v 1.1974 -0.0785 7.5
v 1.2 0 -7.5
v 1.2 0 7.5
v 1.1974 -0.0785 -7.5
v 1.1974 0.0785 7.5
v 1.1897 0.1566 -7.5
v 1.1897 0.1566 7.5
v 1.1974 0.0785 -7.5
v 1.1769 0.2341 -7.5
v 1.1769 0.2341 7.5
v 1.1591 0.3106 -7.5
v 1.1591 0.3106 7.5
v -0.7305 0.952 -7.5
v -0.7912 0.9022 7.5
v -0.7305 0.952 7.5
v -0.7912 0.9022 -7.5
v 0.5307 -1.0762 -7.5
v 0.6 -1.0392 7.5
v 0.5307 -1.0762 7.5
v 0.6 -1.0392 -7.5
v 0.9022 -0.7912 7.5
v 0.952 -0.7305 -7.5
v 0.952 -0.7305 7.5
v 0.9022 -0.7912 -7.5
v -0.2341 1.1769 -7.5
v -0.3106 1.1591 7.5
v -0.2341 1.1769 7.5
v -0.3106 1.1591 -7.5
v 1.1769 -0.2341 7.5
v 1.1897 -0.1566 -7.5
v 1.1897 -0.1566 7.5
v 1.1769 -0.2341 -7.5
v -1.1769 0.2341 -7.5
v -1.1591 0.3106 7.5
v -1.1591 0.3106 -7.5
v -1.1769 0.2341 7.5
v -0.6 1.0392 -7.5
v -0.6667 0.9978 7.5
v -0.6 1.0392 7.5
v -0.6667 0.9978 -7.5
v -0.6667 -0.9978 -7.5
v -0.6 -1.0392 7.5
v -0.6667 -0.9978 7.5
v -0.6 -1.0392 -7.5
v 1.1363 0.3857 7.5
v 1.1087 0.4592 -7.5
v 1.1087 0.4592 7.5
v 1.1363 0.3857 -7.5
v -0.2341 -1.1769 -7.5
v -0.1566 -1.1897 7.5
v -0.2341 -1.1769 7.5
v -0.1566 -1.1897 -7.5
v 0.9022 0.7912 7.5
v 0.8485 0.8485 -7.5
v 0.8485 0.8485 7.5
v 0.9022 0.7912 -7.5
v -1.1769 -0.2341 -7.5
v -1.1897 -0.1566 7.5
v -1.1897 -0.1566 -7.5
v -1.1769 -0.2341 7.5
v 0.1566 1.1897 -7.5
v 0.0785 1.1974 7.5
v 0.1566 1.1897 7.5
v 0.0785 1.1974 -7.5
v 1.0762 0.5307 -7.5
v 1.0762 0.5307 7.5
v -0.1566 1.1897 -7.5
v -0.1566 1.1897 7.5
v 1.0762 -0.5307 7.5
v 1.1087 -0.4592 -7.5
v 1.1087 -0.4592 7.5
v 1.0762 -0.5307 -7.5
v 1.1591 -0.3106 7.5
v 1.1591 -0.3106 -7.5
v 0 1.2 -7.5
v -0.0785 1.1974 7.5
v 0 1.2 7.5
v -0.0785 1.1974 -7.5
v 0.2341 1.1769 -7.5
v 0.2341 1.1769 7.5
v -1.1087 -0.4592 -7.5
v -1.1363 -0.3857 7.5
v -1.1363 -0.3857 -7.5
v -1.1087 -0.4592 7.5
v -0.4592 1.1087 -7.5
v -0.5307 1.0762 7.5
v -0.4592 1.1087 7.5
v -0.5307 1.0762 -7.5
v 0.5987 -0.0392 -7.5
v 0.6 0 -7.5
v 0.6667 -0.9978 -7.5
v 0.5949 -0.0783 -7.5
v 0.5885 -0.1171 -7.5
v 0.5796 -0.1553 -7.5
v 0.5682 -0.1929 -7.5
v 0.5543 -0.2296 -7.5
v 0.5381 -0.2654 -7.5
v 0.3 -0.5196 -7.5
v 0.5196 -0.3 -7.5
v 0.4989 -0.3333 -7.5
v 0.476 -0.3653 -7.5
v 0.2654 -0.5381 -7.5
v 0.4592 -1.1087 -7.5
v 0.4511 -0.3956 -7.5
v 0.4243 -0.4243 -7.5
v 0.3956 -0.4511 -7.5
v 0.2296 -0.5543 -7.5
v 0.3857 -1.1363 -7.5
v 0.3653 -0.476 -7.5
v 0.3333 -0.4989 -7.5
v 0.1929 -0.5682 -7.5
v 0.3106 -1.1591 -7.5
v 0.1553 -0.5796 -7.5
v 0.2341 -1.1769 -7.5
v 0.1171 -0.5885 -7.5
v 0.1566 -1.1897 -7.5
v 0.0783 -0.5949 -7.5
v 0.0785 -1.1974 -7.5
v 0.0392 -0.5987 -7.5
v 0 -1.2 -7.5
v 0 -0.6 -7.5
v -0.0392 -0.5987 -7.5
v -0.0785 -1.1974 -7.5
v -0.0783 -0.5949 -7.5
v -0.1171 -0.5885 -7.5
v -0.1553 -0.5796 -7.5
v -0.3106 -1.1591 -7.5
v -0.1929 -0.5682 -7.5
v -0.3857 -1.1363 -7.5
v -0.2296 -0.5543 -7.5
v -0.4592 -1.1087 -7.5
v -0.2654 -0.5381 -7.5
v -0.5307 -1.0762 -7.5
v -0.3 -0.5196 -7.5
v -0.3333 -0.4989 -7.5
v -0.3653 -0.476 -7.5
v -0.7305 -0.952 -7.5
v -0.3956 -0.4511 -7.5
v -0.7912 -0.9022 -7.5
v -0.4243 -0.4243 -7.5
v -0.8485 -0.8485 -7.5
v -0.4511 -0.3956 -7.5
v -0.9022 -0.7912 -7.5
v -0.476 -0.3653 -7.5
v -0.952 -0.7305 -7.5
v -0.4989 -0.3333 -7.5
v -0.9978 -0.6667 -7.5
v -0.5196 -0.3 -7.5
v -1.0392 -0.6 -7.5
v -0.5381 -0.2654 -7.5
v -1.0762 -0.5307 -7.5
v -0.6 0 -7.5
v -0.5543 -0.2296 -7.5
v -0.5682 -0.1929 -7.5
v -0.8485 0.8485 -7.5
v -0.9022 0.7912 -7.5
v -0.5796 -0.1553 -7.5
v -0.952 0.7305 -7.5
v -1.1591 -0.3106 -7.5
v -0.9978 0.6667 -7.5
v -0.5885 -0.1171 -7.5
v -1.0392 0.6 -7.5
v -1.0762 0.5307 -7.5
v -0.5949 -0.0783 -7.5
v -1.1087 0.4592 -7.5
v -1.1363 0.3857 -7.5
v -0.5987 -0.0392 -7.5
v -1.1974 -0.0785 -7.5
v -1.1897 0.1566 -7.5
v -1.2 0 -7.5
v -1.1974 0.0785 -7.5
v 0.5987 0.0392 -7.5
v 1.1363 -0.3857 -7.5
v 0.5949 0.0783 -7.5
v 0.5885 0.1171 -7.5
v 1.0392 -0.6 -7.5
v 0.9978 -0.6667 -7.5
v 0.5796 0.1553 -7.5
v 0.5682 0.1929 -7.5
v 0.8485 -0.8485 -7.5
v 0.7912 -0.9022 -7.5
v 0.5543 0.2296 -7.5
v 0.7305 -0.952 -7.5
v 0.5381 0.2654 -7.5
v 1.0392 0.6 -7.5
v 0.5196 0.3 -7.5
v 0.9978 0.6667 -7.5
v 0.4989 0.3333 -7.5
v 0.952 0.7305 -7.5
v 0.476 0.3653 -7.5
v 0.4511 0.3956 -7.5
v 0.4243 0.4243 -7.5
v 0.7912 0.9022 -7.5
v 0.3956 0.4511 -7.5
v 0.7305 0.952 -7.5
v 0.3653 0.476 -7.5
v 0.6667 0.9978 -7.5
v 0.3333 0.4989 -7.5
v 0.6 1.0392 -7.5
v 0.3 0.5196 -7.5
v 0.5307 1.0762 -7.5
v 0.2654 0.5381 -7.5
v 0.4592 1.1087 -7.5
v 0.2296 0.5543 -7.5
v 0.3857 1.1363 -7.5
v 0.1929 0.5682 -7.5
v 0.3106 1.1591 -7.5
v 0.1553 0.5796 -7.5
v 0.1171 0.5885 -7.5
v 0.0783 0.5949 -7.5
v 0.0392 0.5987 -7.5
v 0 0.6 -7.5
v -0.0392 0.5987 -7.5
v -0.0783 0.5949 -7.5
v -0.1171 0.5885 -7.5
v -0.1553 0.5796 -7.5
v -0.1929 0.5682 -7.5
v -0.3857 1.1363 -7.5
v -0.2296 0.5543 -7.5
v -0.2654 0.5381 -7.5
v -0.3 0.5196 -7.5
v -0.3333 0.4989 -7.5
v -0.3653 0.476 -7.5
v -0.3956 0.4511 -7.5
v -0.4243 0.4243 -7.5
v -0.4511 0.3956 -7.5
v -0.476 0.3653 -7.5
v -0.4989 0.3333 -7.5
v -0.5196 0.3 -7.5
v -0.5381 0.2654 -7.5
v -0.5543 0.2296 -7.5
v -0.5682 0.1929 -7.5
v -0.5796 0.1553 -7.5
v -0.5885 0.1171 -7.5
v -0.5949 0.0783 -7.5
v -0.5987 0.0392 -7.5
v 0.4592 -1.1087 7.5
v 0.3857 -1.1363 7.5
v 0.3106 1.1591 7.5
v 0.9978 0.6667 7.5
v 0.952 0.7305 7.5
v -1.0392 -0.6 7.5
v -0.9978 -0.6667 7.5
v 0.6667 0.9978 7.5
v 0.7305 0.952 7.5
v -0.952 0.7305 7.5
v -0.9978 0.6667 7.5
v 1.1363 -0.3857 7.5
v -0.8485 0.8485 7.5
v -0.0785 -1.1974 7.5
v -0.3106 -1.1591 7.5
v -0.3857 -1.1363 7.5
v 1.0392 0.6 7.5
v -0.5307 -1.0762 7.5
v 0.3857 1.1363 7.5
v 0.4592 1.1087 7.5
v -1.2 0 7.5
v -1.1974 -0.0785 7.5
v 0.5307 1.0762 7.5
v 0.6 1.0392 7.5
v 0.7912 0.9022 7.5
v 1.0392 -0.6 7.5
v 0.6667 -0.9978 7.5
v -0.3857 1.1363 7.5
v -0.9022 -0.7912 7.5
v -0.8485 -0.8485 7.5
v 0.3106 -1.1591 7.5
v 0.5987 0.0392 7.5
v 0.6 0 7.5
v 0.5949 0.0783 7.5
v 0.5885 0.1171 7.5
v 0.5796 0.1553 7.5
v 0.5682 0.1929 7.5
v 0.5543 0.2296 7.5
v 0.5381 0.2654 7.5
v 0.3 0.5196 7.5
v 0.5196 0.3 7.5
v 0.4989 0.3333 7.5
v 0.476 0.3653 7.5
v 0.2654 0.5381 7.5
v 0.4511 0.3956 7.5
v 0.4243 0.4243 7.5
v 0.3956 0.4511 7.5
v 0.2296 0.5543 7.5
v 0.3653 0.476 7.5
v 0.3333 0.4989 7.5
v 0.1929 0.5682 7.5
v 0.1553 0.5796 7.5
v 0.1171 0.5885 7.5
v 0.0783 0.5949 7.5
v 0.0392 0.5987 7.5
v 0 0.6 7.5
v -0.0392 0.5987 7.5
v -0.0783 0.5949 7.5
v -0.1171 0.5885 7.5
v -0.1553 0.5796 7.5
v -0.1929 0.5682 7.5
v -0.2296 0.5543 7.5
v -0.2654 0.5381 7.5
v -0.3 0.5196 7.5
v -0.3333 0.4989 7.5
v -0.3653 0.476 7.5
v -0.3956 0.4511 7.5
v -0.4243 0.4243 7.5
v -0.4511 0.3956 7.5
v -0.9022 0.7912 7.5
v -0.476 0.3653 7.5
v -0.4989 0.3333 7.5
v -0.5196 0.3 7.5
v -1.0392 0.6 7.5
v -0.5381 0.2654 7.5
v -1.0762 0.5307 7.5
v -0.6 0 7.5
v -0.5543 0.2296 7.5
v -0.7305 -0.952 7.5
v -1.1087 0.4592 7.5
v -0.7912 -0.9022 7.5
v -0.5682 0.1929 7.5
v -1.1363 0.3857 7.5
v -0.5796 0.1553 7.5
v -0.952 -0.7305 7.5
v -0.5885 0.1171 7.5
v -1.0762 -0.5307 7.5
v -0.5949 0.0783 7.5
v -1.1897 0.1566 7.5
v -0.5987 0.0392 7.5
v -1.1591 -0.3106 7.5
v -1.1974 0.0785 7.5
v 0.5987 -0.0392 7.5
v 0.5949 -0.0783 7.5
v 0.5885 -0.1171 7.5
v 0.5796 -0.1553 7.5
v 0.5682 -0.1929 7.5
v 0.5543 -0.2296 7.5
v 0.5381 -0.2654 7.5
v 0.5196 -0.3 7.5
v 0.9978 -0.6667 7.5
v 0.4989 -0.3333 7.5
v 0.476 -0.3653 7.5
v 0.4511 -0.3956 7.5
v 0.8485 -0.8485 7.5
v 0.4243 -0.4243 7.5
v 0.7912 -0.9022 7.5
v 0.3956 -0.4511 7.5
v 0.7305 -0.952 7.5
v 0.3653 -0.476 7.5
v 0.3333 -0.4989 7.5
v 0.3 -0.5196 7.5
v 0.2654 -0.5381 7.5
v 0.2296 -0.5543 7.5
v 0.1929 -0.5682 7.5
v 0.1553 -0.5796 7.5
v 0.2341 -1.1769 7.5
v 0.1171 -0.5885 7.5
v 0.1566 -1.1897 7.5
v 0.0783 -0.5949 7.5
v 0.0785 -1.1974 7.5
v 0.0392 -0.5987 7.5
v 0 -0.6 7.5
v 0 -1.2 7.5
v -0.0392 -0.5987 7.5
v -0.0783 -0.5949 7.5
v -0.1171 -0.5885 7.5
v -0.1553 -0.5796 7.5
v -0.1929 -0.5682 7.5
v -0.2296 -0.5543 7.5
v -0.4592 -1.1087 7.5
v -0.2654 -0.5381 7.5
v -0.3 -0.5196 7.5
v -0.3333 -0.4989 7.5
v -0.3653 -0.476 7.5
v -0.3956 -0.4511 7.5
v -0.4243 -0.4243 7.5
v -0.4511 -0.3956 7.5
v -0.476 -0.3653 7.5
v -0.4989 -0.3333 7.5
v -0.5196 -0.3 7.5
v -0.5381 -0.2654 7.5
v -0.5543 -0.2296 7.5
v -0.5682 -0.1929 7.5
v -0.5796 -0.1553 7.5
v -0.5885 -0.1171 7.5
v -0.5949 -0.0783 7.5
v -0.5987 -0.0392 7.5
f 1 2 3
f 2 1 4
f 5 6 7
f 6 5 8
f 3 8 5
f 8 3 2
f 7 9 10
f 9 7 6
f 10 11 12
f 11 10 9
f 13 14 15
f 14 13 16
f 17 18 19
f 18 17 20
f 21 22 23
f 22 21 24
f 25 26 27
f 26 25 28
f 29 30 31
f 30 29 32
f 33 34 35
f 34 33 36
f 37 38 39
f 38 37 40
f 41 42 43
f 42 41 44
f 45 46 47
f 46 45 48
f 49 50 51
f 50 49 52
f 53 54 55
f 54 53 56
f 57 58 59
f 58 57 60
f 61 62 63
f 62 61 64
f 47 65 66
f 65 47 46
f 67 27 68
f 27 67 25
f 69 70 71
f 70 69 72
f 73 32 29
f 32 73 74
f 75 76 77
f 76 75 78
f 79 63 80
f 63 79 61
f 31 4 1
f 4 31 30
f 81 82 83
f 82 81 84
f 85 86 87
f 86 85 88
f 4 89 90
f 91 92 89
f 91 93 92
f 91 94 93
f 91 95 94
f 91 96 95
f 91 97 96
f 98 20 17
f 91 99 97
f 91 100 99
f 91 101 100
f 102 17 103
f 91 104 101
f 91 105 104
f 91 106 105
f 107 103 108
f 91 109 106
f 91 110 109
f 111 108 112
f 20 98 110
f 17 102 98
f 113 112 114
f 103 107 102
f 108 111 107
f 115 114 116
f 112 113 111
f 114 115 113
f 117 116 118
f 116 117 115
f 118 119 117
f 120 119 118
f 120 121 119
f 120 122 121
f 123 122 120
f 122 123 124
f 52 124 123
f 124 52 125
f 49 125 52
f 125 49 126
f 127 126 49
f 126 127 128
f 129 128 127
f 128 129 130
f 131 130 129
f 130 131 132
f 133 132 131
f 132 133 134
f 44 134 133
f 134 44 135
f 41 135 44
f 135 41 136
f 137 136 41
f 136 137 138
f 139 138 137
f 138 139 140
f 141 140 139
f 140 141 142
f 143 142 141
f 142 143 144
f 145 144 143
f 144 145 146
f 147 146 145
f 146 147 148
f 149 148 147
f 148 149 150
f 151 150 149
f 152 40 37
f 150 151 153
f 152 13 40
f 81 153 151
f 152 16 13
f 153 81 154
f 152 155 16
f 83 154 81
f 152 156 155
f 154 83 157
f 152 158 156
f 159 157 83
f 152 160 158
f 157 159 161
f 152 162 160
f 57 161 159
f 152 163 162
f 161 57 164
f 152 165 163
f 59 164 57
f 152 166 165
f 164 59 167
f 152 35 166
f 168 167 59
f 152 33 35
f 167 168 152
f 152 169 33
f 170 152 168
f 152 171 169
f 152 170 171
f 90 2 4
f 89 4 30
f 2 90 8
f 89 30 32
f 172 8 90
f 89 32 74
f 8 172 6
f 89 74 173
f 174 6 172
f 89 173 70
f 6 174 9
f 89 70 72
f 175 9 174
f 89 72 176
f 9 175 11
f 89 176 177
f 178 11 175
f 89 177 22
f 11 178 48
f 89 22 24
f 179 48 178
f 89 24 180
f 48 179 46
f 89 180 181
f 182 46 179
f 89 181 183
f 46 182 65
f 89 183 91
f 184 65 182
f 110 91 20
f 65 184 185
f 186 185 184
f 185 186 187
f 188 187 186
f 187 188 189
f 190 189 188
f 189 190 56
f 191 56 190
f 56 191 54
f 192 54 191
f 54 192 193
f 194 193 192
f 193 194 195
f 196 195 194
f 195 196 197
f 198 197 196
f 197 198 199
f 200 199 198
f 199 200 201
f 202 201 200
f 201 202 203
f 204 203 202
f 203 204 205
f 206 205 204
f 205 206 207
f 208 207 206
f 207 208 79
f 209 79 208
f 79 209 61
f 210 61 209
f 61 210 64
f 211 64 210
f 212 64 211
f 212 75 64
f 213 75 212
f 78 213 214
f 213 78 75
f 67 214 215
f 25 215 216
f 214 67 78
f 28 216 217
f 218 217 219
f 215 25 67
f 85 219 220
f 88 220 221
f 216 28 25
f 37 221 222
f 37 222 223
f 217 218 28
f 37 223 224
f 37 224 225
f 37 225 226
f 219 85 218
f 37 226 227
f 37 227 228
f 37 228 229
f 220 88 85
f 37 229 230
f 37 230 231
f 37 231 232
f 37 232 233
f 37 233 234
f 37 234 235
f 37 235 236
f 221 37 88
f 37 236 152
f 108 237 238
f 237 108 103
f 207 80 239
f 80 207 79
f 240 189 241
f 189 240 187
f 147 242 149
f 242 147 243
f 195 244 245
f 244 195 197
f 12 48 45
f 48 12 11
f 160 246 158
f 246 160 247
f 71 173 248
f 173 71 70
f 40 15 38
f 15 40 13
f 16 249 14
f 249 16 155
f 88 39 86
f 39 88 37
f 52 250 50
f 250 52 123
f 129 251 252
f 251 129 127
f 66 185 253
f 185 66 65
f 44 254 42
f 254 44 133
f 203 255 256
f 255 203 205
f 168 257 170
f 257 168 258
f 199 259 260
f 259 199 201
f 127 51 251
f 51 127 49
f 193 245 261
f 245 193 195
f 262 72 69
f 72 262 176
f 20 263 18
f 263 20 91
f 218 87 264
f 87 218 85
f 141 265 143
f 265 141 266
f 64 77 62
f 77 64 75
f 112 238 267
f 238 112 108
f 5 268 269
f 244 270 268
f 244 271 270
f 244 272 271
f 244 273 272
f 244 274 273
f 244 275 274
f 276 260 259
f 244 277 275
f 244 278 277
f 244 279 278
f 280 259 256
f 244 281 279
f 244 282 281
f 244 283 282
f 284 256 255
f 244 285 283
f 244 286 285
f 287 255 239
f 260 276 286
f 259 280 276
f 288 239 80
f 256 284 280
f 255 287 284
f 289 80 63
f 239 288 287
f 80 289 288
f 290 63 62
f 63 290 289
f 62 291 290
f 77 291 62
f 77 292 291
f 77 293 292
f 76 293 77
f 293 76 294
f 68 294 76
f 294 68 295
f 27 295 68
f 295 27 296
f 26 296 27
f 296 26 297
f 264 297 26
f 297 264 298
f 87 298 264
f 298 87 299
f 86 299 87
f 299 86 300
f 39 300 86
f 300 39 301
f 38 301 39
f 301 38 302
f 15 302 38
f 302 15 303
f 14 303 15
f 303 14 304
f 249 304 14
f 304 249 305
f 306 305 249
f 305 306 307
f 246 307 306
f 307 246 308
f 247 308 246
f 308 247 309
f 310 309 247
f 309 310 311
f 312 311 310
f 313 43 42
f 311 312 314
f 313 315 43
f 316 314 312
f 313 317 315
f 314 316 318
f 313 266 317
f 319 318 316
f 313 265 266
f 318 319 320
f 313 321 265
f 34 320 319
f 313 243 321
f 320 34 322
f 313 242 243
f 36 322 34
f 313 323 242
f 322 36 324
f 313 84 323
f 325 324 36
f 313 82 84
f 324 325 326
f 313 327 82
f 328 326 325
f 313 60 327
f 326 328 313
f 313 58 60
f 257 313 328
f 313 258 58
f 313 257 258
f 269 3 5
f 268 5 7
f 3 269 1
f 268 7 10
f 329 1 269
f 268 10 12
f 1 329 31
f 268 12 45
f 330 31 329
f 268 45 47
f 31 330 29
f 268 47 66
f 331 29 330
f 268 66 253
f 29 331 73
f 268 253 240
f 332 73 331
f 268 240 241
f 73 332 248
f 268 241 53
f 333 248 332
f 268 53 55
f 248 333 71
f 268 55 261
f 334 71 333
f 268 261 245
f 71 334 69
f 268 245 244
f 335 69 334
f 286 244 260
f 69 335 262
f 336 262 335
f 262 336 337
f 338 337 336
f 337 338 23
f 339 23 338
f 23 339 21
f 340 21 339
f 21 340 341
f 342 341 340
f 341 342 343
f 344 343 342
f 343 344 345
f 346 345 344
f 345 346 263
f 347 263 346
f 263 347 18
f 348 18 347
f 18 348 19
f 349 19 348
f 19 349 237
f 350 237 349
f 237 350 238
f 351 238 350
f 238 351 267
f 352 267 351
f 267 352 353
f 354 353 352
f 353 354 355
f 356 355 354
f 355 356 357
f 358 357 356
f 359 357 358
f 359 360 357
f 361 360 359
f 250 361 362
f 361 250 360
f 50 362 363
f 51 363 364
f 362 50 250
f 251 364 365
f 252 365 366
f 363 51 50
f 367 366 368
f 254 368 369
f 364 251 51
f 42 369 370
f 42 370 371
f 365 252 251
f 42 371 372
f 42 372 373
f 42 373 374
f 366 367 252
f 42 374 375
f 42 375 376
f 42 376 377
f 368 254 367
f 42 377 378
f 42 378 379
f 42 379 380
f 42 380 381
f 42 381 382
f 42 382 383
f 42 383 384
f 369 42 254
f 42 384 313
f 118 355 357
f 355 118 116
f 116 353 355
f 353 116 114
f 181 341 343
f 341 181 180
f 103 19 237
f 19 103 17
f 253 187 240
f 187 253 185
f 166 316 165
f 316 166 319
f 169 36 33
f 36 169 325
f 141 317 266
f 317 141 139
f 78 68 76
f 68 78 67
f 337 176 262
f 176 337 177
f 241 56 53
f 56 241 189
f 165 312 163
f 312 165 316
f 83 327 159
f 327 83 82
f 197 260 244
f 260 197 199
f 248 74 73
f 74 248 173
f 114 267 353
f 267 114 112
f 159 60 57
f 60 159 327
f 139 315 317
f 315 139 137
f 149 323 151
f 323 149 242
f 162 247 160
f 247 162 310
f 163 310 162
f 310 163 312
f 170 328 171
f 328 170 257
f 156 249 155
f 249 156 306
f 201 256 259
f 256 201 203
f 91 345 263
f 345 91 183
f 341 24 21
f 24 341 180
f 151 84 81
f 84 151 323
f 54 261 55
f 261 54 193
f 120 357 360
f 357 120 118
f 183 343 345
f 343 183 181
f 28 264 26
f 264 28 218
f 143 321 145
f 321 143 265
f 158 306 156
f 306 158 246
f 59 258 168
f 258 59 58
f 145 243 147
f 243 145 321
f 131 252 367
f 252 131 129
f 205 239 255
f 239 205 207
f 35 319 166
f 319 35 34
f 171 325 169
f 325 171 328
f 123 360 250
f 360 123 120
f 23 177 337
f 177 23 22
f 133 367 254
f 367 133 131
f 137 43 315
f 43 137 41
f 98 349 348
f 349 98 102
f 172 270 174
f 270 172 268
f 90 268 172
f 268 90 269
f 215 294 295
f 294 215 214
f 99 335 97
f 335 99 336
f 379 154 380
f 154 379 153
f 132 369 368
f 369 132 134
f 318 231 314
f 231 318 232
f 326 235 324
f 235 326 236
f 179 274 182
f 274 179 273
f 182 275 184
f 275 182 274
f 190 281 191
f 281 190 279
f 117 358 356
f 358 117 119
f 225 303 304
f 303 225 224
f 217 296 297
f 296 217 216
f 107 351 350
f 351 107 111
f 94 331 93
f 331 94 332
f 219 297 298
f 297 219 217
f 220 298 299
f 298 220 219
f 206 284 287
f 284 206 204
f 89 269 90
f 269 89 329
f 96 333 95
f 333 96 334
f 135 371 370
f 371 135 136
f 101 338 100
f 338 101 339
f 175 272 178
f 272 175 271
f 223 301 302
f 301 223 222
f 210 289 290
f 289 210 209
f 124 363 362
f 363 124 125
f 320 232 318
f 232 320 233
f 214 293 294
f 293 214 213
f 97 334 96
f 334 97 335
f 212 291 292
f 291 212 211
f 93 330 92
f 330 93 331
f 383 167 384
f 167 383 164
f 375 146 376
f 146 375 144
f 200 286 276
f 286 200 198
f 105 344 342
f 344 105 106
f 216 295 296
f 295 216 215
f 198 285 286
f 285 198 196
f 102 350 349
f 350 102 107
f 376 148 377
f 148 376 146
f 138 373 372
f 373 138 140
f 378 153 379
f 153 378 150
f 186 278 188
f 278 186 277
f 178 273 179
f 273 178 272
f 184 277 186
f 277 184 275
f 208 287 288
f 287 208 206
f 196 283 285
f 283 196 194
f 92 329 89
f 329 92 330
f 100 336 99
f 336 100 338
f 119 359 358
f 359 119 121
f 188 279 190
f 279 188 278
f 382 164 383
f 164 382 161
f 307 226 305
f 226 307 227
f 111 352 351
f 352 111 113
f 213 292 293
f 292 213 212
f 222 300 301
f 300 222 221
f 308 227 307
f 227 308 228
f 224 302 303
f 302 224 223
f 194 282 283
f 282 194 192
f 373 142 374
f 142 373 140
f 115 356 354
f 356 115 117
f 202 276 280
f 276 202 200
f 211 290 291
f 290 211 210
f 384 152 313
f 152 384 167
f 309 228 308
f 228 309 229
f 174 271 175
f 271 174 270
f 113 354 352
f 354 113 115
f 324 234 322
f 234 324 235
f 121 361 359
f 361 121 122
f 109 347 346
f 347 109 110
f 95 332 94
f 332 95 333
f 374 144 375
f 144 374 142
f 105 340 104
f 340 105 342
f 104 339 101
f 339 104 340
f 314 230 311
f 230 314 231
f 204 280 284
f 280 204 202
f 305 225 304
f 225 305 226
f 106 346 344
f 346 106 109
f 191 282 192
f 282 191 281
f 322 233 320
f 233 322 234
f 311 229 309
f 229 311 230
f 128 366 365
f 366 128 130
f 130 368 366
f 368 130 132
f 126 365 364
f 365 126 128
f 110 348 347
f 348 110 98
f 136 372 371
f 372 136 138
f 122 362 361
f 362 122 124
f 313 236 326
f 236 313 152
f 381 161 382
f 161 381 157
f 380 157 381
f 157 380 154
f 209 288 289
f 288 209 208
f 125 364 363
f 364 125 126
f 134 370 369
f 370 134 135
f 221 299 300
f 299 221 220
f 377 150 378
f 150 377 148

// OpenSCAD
// Parameters
tubing_type = 1; //[1:3:1]
length = 15; //[8:40:1]
forced_id = 0; //[0:10:0.1]
center = 1; //[0:1:1]
hs_od_type1 = 2.4; //[1.2:4.8:0.1]
hs_id_type1 = 1.2; //[0.6:2.4:0.1]
hs_od_type2 = 4; //[2:8:0.1]
hs_id_type2 = 2; //[1:4:0.1]
hs_od_type3 = 6; //[3:12:0.1]
hs_id_type3 = 3; //[1.5:6:0.1]
resistor_body_length = 6.3; //[3:15:0.1]
resistor_body_diameter = 2.3; //[1:6:0.1]
lead_diameter = 0.6; //[0.3:1.2:0.05]
lead_total_length = 28; //[10:60:1]
bare_lead_each_side = 5; //[0:15:0.5]
overlap = 1; //[0.5:2:0.1]

$fn = 96;

// Helpers
function sel3(t, a, b, c) = (t==1)?a : (t==2)?b : c;

od = sel3(tubing_type, hs_od_type1, hs_od_type2, hs_od_type3);
id_nom = sel3(tubing_type, hs_id_type1, hs_id_type2, hs_id_type3);
id = (forced_id > 0) ? forced_id : id_nom;

// Ensure valid wall thickness and non-degenerate geometry
eps = 0.02;
id_safe = min(id, od - 2*eps);
od_safe = max(od, id_safe + 2*eps);

// Tubing: hollow cylindrical sleeve (single connected solid)
module tubing() {
  color([0.85, 0.85, 0.8])
  difference() {
    cylinder(h=length, r=od_safe/2, center=true);
    cylinder(h=length + 2*overlap, r=id_safe/2, center=true);
  }
}

// Output: heatshrink sleeving only
translate([0, 0, (center==1) ? 0 : length/2])
  tubing();
